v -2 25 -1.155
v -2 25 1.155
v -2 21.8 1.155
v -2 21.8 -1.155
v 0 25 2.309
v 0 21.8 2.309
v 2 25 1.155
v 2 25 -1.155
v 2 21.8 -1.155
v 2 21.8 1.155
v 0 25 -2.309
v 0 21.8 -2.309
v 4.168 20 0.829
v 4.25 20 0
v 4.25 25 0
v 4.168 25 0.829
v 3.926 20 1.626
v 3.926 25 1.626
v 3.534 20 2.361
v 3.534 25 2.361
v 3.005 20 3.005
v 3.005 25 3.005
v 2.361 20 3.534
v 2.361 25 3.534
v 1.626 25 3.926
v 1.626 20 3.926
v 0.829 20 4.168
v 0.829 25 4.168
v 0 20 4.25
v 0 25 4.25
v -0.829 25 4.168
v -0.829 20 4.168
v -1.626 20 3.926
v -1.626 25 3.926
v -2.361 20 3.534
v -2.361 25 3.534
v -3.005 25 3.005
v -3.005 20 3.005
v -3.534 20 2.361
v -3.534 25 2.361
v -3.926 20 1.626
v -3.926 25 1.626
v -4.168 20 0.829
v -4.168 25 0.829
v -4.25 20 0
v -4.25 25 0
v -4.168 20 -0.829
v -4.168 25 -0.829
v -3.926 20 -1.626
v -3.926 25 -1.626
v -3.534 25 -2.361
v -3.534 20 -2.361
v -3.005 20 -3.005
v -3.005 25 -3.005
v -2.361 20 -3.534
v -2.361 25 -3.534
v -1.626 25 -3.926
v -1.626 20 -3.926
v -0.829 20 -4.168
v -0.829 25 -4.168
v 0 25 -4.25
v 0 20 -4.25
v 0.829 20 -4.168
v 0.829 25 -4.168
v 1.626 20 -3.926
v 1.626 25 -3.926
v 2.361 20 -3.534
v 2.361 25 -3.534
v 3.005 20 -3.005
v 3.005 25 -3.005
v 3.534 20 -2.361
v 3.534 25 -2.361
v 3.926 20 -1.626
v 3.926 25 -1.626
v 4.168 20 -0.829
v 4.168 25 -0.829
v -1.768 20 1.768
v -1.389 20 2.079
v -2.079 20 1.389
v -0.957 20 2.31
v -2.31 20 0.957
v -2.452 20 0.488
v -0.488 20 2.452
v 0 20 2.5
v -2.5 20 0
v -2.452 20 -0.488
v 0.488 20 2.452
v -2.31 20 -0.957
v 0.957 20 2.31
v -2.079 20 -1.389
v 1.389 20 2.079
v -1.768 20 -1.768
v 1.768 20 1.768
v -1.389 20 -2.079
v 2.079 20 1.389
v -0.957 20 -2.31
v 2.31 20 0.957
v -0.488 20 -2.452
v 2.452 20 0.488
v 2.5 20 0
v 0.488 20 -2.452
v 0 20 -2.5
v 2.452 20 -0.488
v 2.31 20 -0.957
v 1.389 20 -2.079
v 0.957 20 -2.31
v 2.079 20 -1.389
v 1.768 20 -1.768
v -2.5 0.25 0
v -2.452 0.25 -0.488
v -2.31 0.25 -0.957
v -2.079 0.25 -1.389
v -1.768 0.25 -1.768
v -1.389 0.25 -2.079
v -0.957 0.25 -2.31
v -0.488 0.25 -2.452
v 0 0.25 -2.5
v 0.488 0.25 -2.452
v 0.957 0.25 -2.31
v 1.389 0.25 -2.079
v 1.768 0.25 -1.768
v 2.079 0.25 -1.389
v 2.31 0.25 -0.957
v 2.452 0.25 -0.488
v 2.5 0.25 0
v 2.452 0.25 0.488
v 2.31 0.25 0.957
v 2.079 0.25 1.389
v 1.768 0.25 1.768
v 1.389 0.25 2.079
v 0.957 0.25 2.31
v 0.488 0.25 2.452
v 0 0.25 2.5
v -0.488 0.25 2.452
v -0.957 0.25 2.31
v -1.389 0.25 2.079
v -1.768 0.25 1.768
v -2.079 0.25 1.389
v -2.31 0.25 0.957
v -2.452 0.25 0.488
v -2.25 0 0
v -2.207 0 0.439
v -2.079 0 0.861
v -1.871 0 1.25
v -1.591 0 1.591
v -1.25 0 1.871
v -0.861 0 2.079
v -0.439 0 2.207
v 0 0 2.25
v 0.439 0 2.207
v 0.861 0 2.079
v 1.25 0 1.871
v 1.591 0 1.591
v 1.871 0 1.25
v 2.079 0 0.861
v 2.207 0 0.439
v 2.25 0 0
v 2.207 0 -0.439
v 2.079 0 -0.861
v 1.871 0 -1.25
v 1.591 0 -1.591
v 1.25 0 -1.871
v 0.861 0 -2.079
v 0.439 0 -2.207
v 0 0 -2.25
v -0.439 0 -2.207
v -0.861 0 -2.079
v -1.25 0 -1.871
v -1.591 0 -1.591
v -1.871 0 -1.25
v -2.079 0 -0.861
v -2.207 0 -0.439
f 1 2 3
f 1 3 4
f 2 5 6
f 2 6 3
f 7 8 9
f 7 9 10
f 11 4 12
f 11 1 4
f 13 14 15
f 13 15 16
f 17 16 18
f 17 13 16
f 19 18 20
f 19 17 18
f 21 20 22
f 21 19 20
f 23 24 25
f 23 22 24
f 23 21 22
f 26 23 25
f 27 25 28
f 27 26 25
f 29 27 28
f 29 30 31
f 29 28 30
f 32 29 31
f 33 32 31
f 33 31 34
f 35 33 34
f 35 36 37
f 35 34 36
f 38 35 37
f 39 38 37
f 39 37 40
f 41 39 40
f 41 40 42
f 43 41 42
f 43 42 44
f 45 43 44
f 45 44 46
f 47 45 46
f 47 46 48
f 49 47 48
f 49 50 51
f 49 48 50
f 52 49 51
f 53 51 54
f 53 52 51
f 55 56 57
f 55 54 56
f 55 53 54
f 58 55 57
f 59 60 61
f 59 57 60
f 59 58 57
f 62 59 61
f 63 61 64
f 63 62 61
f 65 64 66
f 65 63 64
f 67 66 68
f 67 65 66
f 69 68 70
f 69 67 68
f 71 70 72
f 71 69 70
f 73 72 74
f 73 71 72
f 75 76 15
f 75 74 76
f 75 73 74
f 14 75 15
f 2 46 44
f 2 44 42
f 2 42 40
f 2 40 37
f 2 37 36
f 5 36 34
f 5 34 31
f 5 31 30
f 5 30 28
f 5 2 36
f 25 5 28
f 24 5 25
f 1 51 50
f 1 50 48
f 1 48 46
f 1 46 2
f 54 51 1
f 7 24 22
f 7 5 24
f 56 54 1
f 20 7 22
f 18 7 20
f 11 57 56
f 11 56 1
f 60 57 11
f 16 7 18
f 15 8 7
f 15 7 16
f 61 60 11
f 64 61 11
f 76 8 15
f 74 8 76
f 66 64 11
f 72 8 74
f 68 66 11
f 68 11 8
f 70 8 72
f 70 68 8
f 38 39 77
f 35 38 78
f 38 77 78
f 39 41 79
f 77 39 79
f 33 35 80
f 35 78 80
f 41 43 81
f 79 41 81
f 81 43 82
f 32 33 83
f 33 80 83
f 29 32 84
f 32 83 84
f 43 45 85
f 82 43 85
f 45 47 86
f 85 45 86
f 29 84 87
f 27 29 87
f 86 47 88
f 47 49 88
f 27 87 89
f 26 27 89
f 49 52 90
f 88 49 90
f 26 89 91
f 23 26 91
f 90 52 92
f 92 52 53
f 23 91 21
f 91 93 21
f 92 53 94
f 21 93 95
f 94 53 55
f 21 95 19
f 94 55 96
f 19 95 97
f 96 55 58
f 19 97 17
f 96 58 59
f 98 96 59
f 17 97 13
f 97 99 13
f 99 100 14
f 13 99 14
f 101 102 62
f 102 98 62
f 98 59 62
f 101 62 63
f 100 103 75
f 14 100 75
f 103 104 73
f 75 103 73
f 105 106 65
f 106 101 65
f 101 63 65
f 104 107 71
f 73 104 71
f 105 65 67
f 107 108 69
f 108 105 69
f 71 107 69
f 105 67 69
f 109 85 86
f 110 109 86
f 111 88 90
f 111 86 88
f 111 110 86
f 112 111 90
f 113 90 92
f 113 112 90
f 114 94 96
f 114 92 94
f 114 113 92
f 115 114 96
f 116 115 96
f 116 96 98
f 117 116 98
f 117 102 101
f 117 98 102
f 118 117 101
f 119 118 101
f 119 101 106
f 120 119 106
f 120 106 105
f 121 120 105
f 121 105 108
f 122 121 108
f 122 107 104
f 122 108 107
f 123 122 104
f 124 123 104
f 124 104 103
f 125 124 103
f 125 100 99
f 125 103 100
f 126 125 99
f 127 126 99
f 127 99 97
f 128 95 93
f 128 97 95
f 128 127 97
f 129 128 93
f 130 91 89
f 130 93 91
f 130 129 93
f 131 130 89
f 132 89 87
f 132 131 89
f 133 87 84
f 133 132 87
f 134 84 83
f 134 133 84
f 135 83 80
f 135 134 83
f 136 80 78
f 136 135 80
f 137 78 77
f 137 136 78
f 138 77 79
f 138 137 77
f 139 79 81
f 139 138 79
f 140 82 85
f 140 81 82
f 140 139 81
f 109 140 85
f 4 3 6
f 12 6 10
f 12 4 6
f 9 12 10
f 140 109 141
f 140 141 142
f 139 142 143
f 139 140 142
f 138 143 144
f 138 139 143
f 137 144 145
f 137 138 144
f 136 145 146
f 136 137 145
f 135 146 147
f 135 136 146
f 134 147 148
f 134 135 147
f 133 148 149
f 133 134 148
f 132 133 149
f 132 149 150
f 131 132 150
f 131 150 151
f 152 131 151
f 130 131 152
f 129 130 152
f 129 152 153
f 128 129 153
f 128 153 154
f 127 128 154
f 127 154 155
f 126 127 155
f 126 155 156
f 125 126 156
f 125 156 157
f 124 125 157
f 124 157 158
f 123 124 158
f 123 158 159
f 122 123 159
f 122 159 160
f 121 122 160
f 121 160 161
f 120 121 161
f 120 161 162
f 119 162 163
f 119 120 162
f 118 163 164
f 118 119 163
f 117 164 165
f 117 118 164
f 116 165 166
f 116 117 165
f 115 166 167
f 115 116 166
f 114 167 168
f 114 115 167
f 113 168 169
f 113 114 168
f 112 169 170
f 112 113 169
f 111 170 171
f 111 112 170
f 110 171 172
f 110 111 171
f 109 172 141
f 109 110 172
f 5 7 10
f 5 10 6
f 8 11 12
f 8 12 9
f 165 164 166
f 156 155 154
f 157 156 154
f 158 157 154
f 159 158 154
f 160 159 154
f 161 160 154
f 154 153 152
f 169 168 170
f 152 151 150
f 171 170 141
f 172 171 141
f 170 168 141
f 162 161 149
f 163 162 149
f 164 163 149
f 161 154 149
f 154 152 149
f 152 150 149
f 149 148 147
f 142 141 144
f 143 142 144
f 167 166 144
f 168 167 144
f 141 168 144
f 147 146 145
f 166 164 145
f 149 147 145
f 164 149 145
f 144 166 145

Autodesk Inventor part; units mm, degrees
ref_plane "YZ Plane" through (0, 0, 0) normal (1, 0, 0) x (0, 1, 0)
ref_plane "XZ Plane" through (0, 0, 0) normal (0, 1, 0) x (-1, 0, 0)
ref_plane "XY Plane" through (0, 0, 0) normal (0, 0, 1) x (1, 0, 0)
sketch "Sketch1" plane through (0, 0, 0) normal (0, 1, 0) x (-1, 0, 0)
  circle A0 centre (0, 0) radius 2.5
  dimension "d0" = 5
extrude "Extrusion1" add sketch "Sketch1" along normal blind 20
sketch "Sketch2" plane through (0, 20, 0) normal (0, 1, 0) x (1, 0, 0)
  circle A0 centre (0, 0) radius 2.5 projected
  circle A1 centre (0, 0) radius 4.25
  dimension "d3" = 8.5
extrude "Extrusion2" add sketch "Sketch2" along normal blind 5 contours A0 | A1
sketch "Sketch3" plane through (0, 25, 0) normal (0, 1, 0) x (1, 0, 0)
  circle A0 centre (0, 0) radius 4.25 projected
  line L0 (0, 2.3094) -> (2, 1.1547)
  line L1 (2, 1.1547) -> (2, -1.1547)
  line L2 (2, -1.1547) -> (0, -2.3094)
  line L3 (0, -2.3094) -> (-2, -1.1547)
  line L4 (-2, -1.1547) -> (-2, 1.1547)
  line L5 (-2, 1.1547) -> (0, 2.3094)
  dimension "d6" = 2
extrude "Extrusion3" cut sketch "Sketch3" against normal blind 3.2 contours L0 L1 L2 L3 L4 L5
thread "Thread1" size "M5x0.8" class "6g" standard "ANSI Metric M Profile" full length
chamfer "Chamfer1" distance 0.25 angle 45 1 edges at (2.5, 0, 0)
properties part number "M5x22SHCS" material "Stainless Steel"
